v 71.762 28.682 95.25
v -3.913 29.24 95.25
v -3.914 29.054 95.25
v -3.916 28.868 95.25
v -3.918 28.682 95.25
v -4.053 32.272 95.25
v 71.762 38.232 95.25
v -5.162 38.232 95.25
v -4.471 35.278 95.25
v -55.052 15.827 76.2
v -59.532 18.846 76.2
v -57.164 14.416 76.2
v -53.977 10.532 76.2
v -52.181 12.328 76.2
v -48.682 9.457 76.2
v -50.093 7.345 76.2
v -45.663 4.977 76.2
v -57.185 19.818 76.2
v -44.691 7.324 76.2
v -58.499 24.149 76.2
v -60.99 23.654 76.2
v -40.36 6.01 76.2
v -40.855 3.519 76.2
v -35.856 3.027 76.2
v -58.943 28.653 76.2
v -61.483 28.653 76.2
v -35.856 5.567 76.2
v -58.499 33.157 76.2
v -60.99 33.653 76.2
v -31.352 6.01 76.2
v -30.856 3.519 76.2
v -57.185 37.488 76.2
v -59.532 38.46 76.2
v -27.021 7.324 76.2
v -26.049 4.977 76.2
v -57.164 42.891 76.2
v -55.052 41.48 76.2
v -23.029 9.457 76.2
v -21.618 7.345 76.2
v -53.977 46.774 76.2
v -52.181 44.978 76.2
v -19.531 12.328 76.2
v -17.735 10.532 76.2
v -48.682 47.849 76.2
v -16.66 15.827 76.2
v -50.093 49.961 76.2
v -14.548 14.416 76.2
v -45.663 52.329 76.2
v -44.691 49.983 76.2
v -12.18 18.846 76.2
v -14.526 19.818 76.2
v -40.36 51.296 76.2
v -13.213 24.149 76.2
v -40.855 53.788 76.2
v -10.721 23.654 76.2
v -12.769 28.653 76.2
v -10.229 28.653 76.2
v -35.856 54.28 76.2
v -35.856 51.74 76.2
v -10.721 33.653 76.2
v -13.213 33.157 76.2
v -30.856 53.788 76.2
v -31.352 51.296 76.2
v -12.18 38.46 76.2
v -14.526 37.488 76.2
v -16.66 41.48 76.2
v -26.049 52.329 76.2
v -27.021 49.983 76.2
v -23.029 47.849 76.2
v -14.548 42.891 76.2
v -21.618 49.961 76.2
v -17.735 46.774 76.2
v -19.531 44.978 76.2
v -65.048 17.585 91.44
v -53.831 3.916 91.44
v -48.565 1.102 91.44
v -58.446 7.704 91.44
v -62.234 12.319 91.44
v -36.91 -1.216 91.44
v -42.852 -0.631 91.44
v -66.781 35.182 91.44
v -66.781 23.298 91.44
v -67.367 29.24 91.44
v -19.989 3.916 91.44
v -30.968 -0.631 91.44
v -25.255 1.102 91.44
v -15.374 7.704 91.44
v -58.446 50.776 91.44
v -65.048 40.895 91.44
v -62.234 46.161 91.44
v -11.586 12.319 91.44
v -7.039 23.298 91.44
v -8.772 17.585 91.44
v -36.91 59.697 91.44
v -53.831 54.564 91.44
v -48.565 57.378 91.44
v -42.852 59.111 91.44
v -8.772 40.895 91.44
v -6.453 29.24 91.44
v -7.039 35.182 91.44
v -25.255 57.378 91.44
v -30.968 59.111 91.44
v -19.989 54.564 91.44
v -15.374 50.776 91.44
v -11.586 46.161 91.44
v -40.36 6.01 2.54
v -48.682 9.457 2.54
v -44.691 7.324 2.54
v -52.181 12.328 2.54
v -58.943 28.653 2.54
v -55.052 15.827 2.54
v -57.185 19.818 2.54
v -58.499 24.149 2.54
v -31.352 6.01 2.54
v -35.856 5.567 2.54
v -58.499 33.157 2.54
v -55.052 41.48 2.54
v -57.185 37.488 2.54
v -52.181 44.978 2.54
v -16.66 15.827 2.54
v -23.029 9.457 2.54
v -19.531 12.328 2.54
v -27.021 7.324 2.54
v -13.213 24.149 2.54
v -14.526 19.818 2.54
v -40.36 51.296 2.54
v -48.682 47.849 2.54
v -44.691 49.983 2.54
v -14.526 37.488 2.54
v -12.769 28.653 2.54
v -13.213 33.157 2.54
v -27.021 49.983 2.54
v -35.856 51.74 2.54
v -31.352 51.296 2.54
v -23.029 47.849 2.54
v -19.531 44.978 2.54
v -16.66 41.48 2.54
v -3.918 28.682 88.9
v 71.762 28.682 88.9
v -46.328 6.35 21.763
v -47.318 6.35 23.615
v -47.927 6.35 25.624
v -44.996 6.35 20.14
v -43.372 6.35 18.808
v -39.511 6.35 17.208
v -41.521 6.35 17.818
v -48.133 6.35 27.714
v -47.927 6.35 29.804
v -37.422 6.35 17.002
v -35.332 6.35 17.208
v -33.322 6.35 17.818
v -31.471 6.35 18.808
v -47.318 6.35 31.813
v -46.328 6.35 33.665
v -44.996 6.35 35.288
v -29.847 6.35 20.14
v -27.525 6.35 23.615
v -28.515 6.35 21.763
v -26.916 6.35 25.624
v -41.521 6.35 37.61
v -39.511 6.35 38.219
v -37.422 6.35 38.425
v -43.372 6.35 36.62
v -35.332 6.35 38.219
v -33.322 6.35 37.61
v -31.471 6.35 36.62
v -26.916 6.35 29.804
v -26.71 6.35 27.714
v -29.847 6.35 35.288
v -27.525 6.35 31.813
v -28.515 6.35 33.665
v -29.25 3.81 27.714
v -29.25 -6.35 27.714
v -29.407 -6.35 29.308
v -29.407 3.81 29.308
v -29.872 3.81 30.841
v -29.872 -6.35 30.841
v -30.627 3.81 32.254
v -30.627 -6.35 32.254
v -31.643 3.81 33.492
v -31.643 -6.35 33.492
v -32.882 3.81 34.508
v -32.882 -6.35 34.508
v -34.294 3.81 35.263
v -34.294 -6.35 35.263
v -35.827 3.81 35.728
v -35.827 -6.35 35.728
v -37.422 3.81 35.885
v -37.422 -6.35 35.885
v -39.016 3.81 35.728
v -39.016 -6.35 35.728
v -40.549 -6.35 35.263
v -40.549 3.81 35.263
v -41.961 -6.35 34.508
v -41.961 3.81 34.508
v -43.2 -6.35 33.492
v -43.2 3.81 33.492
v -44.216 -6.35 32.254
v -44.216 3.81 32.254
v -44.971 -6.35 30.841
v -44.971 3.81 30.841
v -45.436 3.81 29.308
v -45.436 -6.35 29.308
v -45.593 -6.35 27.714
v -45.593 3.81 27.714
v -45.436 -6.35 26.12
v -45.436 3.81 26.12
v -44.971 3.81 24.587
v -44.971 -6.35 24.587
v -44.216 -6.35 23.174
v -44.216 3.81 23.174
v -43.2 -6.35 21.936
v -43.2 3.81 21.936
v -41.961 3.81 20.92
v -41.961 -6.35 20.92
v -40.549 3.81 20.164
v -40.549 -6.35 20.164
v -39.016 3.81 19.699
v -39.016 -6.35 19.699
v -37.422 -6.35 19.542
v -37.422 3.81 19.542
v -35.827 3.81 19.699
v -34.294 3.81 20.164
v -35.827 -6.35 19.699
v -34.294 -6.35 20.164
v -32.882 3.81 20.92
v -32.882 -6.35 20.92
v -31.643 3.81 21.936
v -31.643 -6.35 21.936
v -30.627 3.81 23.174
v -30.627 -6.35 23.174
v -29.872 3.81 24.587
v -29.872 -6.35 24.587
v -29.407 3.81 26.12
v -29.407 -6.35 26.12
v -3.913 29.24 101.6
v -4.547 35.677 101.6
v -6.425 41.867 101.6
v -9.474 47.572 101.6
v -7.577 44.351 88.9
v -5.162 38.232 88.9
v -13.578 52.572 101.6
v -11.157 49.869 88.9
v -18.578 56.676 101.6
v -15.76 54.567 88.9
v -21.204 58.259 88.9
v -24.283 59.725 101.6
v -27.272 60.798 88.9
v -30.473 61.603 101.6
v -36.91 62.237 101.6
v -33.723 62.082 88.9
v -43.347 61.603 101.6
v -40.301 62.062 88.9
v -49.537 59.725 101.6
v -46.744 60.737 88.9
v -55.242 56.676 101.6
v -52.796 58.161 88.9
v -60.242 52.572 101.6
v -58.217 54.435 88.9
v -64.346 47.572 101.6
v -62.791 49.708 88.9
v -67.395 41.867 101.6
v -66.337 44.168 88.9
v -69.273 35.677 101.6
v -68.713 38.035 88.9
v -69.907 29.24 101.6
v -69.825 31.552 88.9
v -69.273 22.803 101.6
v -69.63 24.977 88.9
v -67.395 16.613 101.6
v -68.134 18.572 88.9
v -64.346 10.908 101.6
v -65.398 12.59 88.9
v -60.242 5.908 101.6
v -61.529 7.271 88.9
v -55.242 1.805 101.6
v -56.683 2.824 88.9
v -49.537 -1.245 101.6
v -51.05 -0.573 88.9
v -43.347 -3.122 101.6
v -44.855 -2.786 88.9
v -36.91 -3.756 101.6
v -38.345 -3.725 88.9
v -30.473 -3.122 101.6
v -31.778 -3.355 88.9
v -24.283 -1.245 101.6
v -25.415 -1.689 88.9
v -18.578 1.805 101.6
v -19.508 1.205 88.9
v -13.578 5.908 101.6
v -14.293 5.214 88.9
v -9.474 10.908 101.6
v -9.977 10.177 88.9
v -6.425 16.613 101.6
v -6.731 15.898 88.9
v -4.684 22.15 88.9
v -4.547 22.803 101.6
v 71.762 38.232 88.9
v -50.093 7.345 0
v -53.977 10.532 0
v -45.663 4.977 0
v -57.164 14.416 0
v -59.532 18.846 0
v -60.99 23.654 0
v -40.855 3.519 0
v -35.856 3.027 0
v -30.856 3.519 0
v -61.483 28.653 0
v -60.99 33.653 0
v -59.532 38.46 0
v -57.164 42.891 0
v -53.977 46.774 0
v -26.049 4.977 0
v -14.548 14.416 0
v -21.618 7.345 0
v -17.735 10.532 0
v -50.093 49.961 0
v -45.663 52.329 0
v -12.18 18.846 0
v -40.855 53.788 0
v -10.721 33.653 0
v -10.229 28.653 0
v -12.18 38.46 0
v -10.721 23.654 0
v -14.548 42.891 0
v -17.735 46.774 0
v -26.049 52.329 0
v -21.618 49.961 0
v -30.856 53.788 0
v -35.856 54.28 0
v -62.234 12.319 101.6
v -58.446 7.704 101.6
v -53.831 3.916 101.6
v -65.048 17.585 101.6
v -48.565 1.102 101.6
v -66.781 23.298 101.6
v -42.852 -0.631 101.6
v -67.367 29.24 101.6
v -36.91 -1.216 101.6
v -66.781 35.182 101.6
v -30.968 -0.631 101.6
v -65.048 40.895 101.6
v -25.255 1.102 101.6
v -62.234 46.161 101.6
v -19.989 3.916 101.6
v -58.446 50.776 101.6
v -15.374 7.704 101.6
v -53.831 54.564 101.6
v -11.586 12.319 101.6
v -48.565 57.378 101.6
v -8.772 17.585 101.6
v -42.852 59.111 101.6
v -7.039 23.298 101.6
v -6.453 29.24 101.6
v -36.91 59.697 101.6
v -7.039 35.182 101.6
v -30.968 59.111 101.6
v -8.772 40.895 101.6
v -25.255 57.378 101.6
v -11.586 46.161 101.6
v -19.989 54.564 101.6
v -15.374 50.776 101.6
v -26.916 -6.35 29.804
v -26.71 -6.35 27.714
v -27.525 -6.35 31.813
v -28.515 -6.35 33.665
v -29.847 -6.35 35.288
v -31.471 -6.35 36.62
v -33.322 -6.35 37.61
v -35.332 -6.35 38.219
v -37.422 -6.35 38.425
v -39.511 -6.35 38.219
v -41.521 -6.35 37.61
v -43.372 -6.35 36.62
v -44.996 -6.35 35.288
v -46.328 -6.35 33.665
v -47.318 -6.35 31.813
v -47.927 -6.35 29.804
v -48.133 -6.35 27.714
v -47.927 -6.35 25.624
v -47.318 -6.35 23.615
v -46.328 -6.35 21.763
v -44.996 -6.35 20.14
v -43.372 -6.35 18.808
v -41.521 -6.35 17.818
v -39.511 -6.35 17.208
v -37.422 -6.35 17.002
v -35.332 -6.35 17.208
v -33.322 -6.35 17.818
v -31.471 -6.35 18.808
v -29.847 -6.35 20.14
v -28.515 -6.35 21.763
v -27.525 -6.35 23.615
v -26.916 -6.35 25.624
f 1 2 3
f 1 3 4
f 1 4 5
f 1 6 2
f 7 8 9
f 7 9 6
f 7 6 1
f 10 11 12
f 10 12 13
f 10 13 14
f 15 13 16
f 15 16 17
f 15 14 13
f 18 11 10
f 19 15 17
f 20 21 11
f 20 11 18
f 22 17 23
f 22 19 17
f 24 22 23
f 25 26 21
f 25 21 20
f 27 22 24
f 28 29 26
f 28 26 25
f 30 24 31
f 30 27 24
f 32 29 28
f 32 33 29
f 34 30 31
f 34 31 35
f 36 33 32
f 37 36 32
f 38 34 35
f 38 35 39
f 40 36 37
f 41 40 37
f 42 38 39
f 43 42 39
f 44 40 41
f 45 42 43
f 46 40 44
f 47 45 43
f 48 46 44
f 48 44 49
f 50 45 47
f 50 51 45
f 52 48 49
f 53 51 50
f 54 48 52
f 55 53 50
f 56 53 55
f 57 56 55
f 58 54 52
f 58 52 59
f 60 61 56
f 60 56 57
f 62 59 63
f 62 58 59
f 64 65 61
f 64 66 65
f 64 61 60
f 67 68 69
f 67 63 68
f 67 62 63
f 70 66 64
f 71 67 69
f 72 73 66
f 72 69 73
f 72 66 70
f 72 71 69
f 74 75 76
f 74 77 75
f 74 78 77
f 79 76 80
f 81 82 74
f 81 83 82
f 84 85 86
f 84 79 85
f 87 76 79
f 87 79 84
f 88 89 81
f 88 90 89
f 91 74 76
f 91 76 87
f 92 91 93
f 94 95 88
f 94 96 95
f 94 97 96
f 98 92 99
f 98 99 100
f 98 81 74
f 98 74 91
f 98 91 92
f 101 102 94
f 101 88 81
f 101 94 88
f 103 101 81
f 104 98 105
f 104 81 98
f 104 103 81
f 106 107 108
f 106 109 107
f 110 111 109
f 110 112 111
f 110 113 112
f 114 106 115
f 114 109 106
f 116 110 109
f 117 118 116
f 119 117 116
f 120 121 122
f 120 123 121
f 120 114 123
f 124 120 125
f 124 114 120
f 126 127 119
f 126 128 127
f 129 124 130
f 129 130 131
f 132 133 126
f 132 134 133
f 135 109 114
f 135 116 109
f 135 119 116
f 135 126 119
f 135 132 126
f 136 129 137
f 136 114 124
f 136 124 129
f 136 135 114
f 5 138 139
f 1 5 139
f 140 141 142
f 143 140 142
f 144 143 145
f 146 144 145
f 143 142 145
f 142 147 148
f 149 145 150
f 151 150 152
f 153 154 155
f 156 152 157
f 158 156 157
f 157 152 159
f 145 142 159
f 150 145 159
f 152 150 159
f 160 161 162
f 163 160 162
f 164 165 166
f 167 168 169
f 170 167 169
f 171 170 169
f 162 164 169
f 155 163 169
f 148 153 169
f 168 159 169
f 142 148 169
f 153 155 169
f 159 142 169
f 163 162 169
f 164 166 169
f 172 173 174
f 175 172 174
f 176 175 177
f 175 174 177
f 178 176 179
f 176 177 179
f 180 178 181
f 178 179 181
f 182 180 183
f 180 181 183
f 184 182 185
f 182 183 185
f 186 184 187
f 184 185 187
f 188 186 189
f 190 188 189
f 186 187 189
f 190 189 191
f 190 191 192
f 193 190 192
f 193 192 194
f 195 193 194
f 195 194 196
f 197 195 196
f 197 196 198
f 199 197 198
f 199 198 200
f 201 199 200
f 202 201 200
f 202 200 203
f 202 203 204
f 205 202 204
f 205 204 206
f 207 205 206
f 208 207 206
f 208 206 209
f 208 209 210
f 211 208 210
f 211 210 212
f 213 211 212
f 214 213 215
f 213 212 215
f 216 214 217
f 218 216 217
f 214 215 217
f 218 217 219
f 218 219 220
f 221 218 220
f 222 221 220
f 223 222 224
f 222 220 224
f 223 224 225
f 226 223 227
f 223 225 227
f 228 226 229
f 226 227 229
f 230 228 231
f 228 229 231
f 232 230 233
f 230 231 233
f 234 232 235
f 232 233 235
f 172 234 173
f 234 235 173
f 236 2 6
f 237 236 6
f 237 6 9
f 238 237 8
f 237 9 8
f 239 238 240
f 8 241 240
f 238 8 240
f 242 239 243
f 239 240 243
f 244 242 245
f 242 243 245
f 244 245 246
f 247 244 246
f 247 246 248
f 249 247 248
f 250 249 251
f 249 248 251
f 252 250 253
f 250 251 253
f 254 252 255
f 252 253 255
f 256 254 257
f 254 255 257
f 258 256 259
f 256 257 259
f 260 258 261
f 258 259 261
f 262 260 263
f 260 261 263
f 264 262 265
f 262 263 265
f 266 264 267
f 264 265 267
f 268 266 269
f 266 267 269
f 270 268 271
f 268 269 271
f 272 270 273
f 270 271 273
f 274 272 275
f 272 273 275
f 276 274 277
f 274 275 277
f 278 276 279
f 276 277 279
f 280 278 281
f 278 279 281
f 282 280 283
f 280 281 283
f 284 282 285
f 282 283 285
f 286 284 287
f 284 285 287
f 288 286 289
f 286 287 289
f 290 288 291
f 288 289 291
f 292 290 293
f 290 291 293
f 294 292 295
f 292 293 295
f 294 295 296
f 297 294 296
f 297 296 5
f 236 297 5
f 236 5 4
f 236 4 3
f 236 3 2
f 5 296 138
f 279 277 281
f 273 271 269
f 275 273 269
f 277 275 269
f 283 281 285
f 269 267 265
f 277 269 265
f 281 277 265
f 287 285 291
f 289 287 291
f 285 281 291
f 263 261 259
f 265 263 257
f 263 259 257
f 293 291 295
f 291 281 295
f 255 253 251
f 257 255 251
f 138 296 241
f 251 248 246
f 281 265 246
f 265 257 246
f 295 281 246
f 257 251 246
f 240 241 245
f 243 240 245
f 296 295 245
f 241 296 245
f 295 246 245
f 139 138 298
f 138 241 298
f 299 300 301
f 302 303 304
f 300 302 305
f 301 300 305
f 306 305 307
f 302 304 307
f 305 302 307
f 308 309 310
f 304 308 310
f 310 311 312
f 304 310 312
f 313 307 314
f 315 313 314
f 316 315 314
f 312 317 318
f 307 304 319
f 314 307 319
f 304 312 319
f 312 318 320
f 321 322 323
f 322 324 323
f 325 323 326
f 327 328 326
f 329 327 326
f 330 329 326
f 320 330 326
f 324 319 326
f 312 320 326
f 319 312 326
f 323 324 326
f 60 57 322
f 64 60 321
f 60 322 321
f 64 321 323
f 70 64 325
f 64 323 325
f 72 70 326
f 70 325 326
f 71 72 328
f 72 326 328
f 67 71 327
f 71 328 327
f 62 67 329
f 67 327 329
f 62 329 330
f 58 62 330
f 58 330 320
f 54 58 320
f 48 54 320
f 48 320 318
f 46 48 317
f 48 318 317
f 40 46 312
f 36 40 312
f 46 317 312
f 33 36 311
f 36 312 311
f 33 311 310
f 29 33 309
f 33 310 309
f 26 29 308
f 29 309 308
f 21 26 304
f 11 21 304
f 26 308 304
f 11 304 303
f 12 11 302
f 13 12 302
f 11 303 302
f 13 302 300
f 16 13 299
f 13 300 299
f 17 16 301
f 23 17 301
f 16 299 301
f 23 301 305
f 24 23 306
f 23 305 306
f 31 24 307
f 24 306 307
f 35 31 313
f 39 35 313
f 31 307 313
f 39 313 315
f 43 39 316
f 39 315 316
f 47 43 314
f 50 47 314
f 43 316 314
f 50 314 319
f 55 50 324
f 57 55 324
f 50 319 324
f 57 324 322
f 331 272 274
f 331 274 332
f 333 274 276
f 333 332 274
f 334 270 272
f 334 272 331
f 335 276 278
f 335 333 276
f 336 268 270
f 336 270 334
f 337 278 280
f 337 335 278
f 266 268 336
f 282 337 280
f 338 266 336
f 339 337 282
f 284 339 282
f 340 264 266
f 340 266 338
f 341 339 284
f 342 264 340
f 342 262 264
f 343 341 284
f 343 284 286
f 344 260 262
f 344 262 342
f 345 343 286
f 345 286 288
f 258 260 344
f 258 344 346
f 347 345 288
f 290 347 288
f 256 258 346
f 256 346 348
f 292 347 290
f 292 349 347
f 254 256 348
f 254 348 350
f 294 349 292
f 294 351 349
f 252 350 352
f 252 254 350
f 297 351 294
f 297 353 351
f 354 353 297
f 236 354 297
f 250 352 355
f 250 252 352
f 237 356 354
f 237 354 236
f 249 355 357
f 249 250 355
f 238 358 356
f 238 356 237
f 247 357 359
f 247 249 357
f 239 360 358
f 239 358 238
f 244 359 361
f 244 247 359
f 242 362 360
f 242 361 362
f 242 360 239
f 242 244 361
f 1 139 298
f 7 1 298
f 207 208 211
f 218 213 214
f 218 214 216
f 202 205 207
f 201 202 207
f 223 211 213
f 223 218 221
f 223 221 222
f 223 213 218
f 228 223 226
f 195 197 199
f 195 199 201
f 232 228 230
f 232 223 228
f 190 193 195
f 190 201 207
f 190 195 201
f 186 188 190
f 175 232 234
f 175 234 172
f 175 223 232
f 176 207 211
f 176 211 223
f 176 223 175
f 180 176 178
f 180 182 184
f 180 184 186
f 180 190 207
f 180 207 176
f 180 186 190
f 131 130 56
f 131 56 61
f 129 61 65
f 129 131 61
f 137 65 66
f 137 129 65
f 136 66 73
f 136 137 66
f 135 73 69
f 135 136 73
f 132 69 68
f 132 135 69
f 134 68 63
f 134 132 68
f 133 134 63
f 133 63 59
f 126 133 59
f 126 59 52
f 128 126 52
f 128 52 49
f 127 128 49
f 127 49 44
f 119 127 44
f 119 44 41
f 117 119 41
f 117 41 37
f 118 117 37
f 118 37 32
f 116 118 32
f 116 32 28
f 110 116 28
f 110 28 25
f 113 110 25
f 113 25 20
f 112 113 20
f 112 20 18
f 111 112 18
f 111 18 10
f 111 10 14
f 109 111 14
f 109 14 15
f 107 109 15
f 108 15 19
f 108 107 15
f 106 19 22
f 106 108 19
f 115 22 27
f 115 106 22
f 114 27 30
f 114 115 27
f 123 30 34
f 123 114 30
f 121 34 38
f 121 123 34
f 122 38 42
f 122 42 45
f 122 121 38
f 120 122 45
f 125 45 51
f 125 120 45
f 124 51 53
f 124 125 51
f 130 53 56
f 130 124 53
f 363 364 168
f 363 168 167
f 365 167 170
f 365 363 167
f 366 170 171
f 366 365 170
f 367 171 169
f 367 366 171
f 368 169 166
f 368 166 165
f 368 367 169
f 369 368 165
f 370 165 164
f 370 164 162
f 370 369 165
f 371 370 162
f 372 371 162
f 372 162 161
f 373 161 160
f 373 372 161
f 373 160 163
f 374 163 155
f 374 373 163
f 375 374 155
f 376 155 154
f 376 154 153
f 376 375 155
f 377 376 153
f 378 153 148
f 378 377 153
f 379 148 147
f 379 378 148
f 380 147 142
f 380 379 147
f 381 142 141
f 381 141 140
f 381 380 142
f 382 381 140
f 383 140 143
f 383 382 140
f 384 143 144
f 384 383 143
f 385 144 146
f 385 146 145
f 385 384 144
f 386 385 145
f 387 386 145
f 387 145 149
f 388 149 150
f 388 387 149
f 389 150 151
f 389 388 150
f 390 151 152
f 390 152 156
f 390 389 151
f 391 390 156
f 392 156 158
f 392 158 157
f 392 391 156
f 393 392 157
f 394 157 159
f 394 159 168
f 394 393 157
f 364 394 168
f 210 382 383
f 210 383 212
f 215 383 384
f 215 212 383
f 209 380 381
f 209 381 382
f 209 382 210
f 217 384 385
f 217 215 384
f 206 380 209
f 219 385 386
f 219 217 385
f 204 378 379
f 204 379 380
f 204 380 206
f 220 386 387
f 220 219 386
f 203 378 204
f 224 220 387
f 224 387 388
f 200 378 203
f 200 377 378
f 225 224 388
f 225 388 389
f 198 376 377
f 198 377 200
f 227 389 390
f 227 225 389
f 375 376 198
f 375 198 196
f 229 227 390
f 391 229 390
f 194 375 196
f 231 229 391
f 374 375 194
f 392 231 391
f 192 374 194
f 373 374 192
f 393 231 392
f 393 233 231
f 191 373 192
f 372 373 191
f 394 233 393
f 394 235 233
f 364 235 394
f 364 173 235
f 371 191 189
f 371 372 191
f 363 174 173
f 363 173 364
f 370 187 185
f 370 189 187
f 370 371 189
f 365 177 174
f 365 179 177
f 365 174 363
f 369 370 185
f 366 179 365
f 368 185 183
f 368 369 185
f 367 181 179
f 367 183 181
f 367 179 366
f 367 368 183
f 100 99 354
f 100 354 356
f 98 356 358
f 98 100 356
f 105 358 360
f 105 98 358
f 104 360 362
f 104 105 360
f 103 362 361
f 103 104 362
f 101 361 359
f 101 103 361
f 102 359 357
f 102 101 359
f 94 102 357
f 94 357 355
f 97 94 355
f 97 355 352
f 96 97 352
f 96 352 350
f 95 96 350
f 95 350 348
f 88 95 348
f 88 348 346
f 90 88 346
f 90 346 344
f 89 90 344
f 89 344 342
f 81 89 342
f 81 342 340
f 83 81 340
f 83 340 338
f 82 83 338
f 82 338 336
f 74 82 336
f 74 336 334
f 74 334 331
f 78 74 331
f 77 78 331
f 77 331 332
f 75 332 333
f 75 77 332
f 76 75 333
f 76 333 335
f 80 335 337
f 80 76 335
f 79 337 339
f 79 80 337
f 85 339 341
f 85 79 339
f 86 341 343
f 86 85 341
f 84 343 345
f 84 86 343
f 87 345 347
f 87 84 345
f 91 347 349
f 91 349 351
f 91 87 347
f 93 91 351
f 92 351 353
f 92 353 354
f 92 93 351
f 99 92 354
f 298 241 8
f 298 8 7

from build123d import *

# Parameters (mm, degrees)
F0_R      = 25.626751
F1_DEPTH  = 76.2
F2_T      = -2.54
F4_R      = 10.7114
F5_DEPTH  = 12.7
F6_T      = -2.54
F10_R     = 32.996544
F11_DEPTH = 12.7
F12_T     = -2.54
F13_W     = 77.405391
F13_H     = 9.550019
F14_DEPTH = 6.35


with BuildPart() as f1:
    # F0 (on Top) → F1 (new body)
    with BuildSketch(Plane.XY):
        with Locations((-35.855755, 28.653288)):
            Circle(F0_R)
    extrude(amount=F1_DEPTH)

    # F2
    f2_openings = [f1.faces().sort_by_distance(p)[0] for p in [
        (-35.855755, 28.653288, 76.2),
    ]]
    offset(amount=F2_T, openings=f2_openings)


with BuildPart() as f5:
    # F4 (on offset) → F5 (new body)
    with BuildSketch(Plane.XZ.offset(6.35)):
        with Locations((-37.421506, 27.713835)):
            Circle(F4_R)
    extrude(amount=-F5_DEPTH)

    # F6
    f6_openings = [f5.faces().sort_by_distance(p)[0] for p in [
        (-37.421506, -6.35, 27.713835),
    ]]
    offset(amount=F6_T, openings=f6_openings)


with BuildPart() as f11:
    # F10 (on offset) → F11 (new body)
    with BuildSketch(Plane.XY.offset(88.9)):
        with Locations((-36.910009, 29.240139)):
            Circle(F10_R)
    extrude(amount=F11_DEPTH)

    # F12
    f12_openings = [f11.faces().sort_by_distance(p)[0] for p in [
        (-36.910009, 29.240139, 101.6),
    ]]
    offset(amount=F12_T, openings=f12_openings)

    # F13 (on offset) → F14 (join)
    with BuildSketch(Plane.XY.offset(88.9)):
        with Locations((33.059724, 33.457451)):
            Rectangle(F13_W, F13_H)
    extrude(amount=F14_DEPTH)


solid = Compound([f1.part, f5.part, f11.part])
